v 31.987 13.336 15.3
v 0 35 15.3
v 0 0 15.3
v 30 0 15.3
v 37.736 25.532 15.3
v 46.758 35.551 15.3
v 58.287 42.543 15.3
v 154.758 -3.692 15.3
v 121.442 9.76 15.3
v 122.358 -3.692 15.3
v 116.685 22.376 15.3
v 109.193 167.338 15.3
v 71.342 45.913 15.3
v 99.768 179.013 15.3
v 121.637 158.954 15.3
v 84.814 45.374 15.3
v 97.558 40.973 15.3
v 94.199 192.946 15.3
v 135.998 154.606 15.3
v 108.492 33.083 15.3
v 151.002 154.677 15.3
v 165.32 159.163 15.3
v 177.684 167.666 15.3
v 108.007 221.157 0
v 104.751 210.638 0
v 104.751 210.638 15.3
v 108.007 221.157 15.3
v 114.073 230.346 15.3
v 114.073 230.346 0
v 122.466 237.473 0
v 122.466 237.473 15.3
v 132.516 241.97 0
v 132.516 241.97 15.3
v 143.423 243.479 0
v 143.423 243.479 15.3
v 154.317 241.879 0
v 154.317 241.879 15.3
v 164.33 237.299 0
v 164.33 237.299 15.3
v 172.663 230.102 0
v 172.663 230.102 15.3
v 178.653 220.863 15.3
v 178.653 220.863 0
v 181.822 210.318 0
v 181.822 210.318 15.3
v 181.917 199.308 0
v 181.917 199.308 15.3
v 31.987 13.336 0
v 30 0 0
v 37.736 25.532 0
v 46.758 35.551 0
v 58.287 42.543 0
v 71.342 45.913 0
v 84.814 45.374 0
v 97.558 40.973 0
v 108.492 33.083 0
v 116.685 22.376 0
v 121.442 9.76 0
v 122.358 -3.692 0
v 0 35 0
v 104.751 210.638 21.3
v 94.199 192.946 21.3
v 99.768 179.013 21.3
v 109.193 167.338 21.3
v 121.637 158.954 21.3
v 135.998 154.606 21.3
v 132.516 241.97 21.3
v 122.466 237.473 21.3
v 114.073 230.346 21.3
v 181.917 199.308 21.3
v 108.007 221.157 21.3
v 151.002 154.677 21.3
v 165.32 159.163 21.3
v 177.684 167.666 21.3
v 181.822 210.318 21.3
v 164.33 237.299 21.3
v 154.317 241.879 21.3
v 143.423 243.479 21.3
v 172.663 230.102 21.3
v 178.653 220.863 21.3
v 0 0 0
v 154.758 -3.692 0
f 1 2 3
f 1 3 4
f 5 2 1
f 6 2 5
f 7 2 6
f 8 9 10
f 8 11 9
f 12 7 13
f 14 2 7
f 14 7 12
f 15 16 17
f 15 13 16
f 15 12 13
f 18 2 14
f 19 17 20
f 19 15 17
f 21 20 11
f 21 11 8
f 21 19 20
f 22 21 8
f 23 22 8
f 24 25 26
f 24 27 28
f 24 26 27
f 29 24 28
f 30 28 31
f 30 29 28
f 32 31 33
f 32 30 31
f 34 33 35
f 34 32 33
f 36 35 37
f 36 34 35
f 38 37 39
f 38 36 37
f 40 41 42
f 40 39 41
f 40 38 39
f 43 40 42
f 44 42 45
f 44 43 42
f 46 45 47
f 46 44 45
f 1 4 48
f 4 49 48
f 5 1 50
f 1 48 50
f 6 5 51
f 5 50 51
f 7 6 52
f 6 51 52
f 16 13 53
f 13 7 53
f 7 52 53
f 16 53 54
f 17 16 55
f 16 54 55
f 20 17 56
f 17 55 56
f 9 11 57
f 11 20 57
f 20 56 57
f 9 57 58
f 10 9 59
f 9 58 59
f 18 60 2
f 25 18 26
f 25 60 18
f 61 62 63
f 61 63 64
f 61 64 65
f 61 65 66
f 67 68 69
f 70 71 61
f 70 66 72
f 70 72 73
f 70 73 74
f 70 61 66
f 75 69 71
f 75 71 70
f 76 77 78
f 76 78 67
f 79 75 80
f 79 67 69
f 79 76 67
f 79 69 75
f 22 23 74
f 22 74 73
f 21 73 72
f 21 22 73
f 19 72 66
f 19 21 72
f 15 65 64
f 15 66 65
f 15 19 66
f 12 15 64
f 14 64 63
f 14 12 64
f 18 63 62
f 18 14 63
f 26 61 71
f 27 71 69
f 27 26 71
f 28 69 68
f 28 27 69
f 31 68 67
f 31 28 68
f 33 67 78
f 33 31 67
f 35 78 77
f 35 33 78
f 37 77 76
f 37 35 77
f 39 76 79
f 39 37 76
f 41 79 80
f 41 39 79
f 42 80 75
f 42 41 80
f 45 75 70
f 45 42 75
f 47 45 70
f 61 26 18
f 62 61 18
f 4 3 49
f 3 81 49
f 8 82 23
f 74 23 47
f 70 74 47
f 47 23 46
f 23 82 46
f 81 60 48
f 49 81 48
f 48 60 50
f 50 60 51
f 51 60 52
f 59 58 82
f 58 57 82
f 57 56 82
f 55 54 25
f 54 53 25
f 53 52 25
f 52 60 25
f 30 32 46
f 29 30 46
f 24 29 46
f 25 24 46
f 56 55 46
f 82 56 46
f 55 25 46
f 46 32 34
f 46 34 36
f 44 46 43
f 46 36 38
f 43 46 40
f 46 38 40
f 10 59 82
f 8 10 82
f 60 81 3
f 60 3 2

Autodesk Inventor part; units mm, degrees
ref_plane "YZ Plane" through (0, 0, 0) normal (1, 0, 0) x (0, 1, 0)
ref_plane "XZ Plane" through (0, 0, 0) normal (0, 1, 0) x (-1, 0, 0)
ref_plane "XY Plane" through (0, 0, 0) normal (0, 0, 1) x (1, 0, 0)
sketch "Sketch1" plane through (0, 0, 0) normal (0, 0, 1) x (1, 0, 0)
  line L0 (0, 0) -> (30, 0)
  arc A0 (122.3584, -3.6921) -> (30, 0) centre (76.2499, -0.076) ccw
  line L1 (122.3584, -3.6921) -> (154.7584, -3.6921)
  line L2 (154.7584, -3.6921) -> (357.7584, -3.6921) construction
  line L3 (0, 0) -> (0, 35)
  arc A1 (181.6354, 197.5208) -> (104.7506, 210.6385) centre (143.2612, 204.4794) ccw
  line L4 (122.3584, -3.6921) -> (132.3584, -3.6921)
  line L5 (0, 35) -> (104.7506, 210.6385)
  line L6 (154.7584, -3.6921) -> (181.9168, 199.3079)
  dimension "d0" = 30
  dimension "d1" = 92.5
  dimension "d2" = 32.4
  dimension "d3" = 203
  dimension "d5" = 35
  dimension "d7" = 10
  dimension "d9" = 78
  dimension "d10" = 203
sketch "Sketch2" plane through (0, 0, 0) normal (0, 0, 1) x (1, 0, 0)
  point P0 (0, 0)
extrude "Extrusion1" add sketch "Sketch1" along normal blind 15.3
sketch "Sketch3" plane through (0, 0, 15.3) normal (0, 0, 1) x (1, 0, 0)
  line L0 (154.7584, -3.6921) -> (181.9168, 199.3079) projected
  arc A0 (94.1987, 192.9457) -> (177.6835, 167.6655) centre (143.2612, 204.4794) ccw
  arc A1 (181.9168, 199.3079) -> (104.7506, 210.6385) centre (143.2612, 204.4794) ccw projected
  line L1 (104.7506, 210.6385) -> (94.1987, 192.9457)
  line L2 (104.7506, 210.6385) -> (0, 35) projected
  line L3 (181.9168, 199.3079) -> (177.6835, 167.6655)
  arc A2 (181.9168, 199.3079) -> (104.7506, 210.6385) centre (143.2612, 204.4794) ccw
  point P0 (0, 0)
  dimension "d19" = 100.8
extrude "Extrusion2" add sketch "Sketch3" along normal blind 6
properties part number "volante conjunto"
